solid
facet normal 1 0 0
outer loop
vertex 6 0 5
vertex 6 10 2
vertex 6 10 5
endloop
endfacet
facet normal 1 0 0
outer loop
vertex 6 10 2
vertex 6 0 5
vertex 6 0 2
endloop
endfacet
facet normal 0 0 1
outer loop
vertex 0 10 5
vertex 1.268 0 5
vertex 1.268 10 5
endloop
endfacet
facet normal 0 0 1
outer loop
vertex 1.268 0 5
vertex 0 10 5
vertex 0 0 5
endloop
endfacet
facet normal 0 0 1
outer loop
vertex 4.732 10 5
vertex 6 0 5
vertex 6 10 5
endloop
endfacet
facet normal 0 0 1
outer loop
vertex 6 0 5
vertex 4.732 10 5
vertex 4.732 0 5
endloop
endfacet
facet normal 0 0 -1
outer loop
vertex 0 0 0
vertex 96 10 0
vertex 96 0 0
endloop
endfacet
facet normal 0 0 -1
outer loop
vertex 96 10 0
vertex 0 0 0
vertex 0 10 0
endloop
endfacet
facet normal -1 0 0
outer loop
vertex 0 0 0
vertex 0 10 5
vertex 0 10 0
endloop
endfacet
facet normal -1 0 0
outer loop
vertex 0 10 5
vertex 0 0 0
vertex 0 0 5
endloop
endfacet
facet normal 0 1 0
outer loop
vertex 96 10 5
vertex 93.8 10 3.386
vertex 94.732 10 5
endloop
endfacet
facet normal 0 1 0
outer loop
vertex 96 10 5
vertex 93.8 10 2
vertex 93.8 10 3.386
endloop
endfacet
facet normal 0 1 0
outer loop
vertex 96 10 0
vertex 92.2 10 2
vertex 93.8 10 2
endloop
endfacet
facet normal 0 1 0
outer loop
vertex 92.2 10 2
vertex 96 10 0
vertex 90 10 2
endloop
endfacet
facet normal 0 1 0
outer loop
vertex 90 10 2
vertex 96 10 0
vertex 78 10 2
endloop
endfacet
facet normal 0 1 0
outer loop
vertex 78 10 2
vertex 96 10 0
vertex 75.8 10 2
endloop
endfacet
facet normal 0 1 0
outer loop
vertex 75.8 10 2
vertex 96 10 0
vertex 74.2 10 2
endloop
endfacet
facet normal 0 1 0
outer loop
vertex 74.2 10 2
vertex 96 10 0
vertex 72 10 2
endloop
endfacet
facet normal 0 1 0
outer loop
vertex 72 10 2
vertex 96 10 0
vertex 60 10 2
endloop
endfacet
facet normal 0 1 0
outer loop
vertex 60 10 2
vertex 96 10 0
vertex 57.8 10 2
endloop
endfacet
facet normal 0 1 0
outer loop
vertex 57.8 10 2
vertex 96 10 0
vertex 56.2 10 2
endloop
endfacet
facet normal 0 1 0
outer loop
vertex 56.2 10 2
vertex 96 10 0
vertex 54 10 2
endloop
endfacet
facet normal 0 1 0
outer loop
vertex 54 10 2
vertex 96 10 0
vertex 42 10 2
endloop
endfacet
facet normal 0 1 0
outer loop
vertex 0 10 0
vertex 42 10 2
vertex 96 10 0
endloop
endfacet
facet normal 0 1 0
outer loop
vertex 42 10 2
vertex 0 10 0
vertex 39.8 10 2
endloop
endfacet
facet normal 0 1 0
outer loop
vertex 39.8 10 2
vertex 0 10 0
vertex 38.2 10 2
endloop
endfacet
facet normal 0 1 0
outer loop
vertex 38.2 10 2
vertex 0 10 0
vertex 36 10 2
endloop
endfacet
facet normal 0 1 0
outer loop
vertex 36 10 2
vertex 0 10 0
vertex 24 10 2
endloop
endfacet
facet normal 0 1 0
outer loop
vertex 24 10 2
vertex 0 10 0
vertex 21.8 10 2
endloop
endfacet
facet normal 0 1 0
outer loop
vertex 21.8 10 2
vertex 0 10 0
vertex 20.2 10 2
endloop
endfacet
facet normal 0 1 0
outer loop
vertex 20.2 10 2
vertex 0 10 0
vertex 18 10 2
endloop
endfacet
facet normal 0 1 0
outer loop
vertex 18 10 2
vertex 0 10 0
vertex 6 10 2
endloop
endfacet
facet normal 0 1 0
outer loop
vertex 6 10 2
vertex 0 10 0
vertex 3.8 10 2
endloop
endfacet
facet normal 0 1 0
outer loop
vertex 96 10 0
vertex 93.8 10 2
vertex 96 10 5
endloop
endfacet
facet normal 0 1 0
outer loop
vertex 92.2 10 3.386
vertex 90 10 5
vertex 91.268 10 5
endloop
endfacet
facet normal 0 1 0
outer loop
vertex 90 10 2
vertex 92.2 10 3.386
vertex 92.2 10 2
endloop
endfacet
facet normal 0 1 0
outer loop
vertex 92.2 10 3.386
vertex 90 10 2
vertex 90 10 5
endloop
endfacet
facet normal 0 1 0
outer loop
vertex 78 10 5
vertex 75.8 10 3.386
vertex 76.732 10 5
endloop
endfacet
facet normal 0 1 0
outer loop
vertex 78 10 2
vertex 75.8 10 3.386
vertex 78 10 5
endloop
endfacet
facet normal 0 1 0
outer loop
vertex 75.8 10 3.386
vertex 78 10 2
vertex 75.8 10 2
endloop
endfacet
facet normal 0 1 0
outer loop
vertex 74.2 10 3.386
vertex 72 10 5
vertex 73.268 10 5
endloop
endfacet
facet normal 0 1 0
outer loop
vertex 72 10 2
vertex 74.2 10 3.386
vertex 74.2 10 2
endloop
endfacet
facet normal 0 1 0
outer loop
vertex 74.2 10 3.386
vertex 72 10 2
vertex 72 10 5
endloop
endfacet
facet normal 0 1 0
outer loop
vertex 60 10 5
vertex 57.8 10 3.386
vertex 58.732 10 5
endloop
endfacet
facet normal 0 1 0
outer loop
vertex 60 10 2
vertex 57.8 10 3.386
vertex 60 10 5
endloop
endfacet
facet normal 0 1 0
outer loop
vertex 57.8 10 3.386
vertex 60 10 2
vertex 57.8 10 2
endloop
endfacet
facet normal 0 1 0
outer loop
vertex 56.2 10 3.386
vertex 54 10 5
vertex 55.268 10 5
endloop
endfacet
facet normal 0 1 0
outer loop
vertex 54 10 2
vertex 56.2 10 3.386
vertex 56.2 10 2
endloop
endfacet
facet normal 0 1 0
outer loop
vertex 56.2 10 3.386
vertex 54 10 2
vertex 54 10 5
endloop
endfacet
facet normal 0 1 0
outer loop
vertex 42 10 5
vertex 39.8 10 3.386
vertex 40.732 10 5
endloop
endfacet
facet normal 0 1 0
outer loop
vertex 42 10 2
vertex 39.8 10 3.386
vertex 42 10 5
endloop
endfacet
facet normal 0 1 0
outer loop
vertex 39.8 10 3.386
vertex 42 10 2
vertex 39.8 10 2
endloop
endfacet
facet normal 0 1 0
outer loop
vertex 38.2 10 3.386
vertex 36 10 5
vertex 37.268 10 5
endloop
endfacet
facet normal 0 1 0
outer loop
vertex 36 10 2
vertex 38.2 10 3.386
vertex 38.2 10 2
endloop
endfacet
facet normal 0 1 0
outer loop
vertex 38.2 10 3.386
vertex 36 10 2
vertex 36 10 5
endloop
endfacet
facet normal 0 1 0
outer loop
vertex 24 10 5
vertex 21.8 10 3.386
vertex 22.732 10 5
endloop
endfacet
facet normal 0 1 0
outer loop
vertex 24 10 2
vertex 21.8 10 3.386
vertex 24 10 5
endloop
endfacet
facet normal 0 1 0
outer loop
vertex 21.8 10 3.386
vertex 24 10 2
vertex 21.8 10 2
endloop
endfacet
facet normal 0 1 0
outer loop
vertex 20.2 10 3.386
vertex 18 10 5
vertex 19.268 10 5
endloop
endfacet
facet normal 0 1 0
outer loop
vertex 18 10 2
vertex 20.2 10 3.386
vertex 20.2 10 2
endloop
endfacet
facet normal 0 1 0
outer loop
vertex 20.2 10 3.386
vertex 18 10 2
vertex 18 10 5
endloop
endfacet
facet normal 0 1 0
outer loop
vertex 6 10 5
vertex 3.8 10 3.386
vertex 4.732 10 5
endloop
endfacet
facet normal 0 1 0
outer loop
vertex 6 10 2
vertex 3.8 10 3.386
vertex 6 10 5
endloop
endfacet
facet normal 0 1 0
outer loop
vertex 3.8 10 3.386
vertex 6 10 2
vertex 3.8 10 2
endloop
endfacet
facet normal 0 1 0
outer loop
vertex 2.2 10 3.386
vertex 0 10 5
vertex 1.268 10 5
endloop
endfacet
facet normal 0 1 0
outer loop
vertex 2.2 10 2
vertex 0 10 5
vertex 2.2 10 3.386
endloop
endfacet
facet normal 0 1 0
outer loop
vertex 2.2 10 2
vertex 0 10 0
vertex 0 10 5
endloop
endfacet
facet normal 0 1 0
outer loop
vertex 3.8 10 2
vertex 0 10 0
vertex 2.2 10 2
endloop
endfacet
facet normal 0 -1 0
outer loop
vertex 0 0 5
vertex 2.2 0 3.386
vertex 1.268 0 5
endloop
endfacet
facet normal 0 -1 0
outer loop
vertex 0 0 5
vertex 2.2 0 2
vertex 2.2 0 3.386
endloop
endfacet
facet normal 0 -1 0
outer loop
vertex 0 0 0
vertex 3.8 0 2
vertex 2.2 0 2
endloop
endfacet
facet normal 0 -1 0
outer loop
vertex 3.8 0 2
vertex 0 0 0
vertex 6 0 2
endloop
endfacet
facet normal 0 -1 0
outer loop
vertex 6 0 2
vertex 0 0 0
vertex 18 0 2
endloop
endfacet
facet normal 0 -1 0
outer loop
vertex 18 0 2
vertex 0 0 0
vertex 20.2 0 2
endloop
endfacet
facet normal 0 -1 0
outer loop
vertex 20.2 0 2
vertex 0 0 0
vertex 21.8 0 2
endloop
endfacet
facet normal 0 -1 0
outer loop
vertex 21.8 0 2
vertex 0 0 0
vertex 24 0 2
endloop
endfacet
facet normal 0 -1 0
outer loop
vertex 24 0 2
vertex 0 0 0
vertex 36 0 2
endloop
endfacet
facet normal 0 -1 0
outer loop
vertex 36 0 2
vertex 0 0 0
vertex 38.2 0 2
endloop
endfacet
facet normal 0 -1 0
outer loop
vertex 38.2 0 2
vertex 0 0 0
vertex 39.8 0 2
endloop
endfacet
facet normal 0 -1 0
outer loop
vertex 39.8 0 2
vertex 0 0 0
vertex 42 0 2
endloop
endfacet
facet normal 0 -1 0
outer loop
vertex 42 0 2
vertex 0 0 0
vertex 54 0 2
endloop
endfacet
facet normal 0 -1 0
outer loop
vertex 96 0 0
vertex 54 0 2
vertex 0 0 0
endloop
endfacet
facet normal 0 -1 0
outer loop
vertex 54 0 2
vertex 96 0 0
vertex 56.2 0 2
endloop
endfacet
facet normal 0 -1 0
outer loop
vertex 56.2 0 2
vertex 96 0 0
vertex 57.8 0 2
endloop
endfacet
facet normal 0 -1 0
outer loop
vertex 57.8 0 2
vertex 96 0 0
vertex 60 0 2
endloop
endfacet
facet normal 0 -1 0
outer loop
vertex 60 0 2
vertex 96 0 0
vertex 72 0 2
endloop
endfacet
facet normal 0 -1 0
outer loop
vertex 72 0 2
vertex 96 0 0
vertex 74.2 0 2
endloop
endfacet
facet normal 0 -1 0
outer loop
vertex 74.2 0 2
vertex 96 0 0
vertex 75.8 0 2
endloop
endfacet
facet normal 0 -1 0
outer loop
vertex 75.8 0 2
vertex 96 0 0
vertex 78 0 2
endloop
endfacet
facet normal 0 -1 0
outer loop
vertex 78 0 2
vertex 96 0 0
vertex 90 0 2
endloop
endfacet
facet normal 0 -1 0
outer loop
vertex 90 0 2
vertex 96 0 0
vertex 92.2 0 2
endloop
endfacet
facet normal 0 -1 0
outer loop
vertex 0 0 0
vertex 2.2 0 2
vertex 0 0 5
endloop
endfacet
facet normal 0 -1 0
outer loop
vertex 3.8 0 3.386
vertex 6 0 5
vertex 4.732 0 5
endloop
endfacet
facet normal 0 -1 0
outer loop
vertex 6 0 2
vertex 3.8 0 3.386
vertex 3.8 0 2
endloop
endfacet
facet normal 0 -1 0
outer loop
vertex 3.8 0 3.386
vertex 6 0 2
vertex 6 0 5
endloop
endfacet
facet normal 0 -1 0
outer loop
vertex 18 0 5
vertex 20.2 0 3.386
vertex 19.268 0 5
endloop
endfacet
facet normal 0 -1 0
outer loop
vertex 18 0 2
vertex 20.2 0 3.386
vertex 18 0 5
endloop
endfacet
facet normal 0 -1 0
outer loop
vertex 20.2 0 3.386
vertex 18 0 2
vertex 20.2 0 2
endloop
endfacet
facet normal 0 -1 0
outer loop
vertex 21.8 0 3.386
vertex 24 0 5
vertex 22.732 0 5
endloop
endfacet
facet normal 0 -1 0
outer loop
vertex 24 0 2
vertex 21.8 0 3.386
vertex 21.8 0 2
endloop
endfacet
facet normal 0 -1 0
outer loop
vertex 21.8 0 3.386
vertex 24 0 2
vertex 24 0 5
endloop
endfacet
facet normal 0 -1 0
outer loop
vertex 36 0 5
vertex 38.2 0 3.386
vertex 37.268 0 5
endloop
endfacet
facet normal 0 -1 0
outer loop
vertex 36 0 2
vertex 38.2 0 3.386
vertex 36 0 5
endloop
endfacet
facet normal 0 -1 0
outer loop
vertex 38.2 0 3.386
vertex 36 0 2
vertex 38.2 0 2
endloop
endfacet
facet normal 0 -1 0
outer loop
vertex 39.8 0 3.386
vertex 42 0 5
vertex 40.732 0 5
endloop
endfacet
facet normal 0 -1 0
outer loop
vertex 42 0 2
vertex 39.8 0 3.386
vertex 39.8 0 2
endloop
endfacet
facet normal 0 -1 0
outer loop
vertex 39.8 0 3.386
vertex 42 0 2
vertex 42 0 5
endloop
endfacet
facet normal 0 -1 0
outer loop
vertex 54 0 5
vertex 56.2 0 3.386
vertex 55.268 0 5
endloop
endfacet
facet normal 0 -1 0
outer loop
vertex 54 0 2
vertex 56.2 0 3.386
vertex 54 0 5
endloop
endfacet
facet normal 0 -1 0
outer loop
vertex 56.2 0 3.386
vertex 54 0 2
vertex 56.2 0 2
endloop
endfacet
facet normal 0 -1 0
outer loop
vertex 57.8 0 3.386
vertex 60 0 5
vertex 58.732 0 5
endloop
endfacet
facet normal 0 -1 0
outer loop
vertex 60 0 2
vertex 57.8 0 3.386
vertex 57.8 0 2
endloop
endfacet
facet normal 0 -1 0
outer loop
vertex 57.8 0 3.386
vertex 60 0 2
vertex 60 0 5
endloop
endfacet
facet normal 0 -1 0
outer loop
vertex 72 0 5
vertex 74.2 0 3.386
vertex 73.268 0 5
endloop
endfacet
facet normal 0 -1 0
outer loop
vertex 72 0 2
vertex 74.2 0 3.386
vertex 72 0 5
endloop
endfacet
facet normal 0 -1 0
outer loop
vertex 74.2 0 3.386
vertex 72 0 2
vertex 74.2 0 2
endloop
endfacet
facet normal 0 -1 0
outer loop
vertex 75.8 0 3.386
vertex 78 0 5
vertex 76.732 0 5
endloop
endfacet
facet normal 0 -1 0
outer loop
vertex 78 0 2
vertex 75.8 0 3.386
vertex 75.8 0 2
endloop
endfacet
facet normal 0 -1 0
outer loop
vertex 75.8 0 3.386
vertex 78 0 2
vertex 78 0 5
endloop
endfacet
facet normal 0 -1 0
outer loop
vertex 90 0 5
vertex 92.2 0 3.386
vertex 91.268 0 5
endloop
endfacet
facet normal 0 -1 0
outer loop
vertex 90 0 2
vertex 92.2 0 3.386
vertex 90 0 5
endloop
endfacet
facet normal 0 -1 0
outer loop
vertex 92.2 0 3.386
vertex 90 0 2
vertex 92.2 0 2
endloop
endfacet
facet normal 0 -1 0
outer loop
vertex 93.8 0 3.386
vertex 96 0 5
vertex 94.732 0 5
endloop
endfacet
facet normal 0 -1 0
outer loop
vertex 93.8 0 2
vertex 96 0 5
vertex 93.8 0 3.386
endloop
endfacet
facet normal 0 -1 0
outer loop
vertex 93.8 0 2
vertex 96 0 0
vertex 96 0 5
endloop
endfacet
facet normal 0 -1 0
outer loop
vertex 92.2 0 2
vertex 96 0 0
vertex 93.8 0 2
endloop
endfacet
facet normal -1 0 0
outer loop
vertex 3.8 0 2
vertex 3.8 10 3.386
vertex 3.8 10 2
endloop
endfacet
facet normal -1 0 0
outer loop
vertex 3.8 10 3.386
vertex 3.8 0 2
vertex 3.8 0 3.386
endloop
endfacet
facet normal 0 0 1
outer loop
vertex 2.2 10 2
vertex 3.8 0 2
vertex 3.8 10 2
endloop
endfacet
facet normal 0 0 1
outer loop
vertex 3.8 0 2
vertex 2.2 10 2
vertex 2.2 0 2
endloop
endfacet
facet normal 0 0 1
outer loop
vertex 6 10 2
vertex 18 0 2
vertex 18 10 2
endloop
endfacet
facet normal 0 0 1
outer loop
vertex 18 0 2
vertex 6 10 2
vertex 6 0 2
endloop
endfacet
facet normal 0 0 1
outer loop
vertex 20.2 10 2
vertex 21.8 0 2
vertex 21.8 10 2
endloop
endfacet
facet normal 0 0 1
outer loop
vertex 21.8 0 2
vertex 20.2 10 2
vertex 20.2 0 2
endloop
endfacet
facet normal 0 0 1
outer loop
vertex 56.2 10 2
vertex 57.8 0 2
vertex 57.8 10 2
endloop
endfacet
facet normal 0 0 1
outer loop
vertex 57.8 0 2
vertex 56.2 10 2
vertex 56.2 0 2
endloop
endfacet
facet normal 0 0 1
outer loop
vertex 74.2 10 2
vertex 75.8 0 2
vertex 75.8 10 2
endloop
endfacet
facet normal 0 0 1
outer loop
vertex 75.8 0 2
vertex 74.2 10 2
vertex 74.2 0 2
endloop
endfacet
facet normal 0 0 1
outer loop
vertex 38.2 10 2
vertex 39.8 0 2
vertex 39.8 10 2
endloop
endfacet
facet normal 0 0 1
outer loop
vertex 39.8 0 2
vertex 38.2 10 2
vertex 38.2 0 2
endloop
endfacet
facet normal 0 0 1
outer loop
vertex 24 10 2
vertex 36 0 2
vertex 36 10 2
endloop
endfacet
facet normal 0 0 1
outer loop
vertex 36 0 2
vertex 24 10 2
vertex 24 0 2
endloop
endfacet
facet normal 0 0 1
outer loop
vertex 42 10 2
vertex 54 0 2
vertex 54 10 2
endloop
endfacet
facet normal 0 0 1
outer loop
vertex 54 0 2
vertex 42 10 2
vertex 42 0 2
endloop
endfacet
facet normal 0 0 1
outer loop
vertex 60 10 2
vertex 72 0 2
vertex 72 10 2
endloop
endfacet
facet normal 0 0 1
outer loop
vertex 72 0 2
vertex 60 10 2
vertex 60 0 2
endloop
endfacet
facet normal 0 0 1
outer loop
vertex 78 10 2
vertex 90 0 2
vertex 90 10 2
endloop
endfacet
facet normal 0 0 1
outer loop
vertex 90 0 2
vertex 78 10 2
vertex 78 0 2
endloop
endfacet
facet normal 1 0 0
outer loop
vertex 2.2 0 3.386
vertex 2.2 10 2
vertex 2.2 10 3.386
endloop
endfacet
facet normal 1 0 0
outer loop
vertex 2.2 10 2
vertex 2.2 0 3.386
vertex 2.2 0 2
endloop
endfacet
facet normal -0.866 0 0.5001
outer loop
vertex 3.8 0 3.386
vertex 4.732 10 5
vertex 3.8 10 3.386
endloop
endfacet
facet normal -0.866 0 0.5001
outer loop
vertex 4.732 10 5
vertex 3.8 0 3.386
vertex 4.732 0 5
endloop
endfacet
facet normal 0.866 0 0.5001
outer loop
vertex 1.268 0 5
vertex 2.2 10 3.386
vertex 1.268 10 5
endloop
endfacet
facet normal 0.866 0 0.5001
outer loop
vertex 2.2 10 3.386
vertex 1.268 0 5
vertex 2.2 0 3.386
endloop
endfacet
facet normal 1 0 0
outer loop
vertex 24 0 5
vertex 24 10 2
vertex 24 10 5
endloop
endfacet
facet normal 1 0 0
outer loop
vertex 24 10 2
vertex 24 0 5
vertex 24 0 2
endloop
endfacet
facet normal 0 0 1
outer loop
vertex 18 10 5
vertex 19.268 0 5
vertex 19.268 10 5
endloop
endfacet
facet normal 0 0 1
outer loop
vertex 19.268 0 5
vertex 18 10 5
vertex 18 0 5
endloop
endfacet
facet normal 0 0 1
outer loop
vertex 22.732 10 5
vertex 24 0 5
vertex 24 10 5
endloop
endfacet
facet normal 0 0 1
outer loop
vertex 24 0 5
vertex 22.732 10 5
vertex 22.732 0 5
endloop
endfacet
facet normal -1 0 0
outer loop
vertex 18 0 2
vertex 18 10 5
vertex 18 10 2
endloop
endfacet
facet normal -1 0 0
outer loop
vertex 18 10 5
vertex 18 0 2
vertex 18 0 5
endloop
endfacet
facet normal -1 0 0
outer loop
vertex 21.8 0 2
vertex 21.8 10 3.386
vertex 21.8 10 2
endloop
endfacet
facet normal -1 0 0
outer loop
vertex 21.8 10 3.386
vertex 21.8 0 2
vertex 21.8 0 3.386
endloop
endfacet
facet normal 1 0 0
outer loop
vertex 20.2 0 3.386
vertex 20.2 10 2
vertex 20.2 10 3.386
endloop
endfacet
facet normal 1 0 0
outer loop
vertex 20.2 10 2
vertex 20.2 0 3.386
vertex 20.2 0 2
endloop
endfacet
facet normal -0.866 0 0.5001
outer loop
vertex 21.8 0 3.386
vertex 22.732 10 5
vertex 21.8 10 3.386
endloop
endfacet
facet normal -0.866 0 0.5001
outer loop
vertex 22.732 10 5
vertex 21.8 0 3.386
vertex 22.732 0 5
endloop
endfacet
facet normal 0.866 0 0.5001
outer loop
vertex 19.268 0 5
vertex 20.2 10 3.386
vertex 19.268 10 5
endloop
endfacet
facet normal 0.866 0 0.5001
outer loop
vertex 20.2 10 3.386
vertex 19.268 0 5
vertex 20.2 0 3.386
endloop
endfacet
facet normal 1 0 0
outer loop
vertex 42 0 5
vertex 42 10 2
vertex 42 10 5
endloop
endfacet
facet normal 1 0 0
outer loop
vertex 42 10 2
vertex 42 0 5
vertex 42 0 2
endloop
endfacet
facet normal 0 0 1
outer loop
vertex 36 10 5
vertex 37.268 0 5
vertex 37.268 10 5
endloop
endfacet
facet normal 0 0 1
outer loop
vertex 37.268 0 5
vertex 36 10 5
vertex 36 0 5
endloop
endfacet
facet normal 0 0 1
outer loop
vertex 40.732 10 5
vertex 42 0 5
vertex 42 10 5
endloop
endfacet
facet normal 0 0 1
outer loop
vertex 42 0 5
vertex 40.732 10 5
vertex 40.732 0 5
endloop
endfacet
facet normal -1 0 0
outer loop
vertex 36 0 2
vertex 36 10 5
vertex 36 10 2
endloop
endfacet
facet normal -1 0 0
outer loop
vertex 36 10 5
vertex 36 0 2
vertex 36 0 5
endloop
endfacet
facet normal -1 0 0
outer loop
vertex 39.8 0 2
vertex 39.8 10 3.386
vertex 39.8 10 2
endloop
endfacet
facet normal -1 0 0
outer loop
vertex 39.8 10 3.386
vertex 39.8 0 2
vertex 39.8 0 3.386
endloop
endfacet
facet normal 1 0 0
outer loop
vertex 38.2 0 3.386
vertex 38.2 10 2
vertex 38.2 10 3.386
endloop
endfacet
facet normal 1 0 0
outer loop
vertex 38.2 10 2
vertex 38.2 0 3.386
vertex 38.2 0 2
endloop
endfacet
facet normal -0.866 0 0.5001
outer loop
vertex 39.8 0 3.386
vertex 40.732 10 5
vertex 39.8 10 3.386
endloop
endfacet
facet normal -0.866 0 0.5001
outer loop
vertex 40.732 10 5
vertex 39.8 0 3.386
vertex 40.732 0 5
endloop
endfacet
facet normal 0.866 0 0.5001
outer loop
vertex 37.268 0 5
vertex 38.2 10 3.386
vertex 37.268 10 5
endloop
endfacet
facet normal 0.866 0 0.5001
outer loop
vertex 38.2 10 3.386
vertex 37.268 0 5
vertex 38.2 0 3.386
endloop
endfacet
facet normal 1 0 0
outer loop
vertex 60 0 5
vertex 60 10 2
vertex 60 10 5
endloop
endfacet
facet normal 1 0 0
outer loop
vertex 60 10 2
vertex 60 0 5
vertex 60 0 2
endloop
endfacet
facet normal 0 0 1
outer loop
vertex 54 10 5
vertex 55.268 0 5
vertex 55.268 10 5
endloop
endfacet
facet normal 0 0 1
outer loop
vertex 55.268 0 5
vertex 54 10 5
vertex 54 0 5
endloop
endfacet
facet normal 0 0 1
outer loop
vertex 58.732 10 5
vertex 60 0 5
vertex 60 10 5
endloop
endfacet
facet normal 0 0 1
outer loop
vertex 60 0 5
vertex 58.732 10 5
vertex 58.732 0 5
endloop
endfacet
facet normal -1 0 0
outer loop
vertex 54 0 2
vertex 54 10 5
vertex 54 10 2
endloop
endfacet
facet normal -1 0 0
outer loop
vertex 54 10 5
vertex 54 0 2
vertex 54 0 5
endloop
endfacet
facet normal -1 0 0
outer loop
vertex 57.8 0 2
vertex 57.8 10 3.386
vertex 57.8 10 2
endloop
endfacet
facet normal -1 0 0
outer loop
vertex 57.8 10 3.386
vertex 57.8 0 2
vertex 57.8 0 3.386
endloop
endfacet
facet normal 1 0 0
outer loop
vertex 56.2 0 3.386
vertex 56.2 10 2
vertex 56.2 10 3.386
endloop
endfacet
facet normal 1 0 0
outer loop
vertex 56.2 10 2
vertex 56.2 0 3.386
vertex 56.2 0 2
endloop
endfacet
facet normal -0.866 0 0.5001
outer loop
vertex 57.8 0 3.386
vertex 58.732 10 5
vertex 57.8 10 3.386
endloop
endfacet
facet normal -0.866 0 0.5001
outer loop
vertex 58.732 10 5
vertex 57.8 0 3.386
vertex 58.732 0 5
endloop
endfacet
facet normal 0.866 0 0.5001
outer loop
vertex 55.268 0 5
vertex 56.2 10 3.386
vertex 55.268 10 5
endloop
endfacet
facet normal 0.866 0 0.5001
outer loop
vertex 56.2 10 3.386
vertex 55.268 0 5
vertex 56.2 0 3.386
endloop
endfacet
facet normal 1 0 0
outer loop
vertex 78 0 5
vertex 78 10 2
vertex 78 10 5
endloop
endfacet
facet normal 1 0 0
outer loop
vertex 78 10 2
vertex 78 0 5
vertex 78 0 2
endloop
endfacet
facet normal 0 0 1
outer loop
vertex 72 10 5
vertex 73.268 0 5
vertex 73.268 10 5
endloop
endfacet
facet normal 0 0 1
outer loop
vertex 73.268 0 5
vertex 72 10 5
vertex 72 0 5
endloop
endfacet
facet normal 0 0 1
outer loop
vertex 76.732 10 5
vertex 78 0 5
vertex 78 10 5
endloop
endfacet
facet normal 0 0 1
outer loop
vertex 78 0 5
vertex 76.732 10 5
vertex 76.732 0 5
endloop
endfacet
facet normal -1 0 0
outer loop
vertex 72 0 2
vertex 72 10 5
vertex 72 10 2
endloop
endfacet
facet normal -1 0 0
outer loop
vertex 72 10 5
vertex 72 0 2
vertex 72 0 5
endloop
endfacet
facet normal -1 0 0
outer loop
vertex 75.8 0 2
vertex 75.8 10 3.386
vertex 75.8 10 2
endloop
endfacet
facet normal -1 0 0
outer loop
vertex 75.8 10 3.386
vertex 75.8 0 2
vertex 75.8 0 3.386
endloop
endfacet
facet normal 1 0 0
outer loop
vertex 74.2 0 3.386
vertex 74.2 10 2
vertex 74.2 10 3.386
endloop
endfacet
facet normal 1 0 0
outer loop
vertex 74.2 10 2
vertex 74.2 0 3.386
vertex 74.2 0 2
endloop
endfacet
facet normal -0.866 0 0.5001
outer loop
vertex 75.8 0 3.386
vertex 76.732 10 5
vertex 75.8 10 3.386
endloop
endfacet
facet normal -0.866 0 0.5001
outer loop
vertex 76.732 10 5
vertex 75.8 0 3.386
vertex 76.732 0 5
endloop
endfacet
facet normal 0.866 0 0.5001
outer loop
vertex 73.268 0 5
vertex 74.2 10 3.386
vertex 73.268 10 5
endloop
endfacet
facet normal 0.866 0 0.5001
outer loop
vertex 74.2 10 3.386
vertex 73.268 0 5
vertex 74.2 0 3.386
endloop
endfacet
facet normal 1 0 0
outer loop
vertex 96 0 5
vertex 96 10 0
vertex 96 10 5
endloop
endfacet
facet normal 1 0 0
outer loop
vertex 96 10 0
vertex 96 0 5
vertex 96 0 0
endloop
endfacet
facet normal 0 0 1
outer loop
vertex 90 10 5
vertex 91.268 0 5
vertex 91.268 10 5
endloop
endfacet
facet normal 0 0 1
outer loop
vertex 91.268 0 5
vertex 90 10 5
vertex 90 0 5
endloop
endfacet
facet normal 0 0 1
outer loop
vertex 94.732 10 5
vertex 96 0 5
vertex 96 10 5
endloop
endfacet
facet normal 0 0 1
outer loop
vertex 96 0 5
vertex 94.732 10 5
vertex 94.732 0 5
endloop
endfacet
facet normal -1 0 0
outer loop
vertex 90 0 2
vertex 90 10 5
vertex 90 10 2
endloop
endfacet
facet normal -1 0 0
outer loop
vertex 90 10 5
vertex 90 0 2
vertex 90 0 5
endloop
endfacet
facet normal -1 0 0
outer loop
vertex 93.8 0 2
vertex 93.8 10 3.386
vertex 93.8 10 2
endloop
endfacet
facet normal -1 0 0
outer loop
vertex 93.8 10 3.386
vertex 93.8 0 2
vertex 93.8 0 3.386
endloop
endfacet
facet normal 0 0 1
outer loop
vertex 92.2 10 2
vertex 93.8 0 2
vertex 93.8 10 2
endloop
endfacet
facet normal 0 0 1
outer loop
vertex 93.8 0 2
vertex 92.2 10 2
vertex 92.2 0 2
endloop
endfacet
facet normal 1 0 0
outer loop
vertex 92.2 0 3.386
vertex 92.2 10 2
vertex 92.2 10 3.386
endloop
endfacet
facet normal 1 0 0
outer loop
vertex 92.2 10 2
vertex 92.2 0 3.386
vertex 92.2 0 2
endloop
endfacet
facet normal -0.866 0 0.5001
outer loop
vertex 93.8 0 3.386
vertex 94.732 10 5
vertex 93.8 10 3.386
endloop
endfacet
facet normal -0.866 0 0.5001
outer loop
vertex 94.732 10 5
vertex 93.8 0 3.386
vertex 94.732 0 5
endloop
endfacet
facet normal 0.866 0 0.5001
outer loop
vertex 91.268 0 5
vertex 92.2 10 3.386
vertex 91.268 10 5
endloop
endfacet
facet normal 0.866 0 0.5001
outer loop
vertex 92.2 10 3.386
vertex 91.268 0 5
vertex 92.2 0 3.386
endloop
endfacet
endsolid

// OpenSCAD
// karty są co 18mm
// pcb mają grubość 1.6mm

$karty = 6;

module pcb_holder() {
    difference() {
        cube([6,10,5]);
        // wyciecie na PCB 2.0mm
        //translate([2,-5,2]) cube([2,20,5]);
        // wyciecie na PCB 1.6mm
        translate([2.2,-5,2]) cube([1.6,20,5]);
        translate([3,15,7]) rotate([90,90,0]) cylinder(r=5,h=20,$fn=3);
    }
}

pcb_holder();

for ( i = [0 : $karty-1] ){
    translate([i*18, 0, 0])
    pcb_holder();
}

cube([($karty-1)*18+2,10,2]);
